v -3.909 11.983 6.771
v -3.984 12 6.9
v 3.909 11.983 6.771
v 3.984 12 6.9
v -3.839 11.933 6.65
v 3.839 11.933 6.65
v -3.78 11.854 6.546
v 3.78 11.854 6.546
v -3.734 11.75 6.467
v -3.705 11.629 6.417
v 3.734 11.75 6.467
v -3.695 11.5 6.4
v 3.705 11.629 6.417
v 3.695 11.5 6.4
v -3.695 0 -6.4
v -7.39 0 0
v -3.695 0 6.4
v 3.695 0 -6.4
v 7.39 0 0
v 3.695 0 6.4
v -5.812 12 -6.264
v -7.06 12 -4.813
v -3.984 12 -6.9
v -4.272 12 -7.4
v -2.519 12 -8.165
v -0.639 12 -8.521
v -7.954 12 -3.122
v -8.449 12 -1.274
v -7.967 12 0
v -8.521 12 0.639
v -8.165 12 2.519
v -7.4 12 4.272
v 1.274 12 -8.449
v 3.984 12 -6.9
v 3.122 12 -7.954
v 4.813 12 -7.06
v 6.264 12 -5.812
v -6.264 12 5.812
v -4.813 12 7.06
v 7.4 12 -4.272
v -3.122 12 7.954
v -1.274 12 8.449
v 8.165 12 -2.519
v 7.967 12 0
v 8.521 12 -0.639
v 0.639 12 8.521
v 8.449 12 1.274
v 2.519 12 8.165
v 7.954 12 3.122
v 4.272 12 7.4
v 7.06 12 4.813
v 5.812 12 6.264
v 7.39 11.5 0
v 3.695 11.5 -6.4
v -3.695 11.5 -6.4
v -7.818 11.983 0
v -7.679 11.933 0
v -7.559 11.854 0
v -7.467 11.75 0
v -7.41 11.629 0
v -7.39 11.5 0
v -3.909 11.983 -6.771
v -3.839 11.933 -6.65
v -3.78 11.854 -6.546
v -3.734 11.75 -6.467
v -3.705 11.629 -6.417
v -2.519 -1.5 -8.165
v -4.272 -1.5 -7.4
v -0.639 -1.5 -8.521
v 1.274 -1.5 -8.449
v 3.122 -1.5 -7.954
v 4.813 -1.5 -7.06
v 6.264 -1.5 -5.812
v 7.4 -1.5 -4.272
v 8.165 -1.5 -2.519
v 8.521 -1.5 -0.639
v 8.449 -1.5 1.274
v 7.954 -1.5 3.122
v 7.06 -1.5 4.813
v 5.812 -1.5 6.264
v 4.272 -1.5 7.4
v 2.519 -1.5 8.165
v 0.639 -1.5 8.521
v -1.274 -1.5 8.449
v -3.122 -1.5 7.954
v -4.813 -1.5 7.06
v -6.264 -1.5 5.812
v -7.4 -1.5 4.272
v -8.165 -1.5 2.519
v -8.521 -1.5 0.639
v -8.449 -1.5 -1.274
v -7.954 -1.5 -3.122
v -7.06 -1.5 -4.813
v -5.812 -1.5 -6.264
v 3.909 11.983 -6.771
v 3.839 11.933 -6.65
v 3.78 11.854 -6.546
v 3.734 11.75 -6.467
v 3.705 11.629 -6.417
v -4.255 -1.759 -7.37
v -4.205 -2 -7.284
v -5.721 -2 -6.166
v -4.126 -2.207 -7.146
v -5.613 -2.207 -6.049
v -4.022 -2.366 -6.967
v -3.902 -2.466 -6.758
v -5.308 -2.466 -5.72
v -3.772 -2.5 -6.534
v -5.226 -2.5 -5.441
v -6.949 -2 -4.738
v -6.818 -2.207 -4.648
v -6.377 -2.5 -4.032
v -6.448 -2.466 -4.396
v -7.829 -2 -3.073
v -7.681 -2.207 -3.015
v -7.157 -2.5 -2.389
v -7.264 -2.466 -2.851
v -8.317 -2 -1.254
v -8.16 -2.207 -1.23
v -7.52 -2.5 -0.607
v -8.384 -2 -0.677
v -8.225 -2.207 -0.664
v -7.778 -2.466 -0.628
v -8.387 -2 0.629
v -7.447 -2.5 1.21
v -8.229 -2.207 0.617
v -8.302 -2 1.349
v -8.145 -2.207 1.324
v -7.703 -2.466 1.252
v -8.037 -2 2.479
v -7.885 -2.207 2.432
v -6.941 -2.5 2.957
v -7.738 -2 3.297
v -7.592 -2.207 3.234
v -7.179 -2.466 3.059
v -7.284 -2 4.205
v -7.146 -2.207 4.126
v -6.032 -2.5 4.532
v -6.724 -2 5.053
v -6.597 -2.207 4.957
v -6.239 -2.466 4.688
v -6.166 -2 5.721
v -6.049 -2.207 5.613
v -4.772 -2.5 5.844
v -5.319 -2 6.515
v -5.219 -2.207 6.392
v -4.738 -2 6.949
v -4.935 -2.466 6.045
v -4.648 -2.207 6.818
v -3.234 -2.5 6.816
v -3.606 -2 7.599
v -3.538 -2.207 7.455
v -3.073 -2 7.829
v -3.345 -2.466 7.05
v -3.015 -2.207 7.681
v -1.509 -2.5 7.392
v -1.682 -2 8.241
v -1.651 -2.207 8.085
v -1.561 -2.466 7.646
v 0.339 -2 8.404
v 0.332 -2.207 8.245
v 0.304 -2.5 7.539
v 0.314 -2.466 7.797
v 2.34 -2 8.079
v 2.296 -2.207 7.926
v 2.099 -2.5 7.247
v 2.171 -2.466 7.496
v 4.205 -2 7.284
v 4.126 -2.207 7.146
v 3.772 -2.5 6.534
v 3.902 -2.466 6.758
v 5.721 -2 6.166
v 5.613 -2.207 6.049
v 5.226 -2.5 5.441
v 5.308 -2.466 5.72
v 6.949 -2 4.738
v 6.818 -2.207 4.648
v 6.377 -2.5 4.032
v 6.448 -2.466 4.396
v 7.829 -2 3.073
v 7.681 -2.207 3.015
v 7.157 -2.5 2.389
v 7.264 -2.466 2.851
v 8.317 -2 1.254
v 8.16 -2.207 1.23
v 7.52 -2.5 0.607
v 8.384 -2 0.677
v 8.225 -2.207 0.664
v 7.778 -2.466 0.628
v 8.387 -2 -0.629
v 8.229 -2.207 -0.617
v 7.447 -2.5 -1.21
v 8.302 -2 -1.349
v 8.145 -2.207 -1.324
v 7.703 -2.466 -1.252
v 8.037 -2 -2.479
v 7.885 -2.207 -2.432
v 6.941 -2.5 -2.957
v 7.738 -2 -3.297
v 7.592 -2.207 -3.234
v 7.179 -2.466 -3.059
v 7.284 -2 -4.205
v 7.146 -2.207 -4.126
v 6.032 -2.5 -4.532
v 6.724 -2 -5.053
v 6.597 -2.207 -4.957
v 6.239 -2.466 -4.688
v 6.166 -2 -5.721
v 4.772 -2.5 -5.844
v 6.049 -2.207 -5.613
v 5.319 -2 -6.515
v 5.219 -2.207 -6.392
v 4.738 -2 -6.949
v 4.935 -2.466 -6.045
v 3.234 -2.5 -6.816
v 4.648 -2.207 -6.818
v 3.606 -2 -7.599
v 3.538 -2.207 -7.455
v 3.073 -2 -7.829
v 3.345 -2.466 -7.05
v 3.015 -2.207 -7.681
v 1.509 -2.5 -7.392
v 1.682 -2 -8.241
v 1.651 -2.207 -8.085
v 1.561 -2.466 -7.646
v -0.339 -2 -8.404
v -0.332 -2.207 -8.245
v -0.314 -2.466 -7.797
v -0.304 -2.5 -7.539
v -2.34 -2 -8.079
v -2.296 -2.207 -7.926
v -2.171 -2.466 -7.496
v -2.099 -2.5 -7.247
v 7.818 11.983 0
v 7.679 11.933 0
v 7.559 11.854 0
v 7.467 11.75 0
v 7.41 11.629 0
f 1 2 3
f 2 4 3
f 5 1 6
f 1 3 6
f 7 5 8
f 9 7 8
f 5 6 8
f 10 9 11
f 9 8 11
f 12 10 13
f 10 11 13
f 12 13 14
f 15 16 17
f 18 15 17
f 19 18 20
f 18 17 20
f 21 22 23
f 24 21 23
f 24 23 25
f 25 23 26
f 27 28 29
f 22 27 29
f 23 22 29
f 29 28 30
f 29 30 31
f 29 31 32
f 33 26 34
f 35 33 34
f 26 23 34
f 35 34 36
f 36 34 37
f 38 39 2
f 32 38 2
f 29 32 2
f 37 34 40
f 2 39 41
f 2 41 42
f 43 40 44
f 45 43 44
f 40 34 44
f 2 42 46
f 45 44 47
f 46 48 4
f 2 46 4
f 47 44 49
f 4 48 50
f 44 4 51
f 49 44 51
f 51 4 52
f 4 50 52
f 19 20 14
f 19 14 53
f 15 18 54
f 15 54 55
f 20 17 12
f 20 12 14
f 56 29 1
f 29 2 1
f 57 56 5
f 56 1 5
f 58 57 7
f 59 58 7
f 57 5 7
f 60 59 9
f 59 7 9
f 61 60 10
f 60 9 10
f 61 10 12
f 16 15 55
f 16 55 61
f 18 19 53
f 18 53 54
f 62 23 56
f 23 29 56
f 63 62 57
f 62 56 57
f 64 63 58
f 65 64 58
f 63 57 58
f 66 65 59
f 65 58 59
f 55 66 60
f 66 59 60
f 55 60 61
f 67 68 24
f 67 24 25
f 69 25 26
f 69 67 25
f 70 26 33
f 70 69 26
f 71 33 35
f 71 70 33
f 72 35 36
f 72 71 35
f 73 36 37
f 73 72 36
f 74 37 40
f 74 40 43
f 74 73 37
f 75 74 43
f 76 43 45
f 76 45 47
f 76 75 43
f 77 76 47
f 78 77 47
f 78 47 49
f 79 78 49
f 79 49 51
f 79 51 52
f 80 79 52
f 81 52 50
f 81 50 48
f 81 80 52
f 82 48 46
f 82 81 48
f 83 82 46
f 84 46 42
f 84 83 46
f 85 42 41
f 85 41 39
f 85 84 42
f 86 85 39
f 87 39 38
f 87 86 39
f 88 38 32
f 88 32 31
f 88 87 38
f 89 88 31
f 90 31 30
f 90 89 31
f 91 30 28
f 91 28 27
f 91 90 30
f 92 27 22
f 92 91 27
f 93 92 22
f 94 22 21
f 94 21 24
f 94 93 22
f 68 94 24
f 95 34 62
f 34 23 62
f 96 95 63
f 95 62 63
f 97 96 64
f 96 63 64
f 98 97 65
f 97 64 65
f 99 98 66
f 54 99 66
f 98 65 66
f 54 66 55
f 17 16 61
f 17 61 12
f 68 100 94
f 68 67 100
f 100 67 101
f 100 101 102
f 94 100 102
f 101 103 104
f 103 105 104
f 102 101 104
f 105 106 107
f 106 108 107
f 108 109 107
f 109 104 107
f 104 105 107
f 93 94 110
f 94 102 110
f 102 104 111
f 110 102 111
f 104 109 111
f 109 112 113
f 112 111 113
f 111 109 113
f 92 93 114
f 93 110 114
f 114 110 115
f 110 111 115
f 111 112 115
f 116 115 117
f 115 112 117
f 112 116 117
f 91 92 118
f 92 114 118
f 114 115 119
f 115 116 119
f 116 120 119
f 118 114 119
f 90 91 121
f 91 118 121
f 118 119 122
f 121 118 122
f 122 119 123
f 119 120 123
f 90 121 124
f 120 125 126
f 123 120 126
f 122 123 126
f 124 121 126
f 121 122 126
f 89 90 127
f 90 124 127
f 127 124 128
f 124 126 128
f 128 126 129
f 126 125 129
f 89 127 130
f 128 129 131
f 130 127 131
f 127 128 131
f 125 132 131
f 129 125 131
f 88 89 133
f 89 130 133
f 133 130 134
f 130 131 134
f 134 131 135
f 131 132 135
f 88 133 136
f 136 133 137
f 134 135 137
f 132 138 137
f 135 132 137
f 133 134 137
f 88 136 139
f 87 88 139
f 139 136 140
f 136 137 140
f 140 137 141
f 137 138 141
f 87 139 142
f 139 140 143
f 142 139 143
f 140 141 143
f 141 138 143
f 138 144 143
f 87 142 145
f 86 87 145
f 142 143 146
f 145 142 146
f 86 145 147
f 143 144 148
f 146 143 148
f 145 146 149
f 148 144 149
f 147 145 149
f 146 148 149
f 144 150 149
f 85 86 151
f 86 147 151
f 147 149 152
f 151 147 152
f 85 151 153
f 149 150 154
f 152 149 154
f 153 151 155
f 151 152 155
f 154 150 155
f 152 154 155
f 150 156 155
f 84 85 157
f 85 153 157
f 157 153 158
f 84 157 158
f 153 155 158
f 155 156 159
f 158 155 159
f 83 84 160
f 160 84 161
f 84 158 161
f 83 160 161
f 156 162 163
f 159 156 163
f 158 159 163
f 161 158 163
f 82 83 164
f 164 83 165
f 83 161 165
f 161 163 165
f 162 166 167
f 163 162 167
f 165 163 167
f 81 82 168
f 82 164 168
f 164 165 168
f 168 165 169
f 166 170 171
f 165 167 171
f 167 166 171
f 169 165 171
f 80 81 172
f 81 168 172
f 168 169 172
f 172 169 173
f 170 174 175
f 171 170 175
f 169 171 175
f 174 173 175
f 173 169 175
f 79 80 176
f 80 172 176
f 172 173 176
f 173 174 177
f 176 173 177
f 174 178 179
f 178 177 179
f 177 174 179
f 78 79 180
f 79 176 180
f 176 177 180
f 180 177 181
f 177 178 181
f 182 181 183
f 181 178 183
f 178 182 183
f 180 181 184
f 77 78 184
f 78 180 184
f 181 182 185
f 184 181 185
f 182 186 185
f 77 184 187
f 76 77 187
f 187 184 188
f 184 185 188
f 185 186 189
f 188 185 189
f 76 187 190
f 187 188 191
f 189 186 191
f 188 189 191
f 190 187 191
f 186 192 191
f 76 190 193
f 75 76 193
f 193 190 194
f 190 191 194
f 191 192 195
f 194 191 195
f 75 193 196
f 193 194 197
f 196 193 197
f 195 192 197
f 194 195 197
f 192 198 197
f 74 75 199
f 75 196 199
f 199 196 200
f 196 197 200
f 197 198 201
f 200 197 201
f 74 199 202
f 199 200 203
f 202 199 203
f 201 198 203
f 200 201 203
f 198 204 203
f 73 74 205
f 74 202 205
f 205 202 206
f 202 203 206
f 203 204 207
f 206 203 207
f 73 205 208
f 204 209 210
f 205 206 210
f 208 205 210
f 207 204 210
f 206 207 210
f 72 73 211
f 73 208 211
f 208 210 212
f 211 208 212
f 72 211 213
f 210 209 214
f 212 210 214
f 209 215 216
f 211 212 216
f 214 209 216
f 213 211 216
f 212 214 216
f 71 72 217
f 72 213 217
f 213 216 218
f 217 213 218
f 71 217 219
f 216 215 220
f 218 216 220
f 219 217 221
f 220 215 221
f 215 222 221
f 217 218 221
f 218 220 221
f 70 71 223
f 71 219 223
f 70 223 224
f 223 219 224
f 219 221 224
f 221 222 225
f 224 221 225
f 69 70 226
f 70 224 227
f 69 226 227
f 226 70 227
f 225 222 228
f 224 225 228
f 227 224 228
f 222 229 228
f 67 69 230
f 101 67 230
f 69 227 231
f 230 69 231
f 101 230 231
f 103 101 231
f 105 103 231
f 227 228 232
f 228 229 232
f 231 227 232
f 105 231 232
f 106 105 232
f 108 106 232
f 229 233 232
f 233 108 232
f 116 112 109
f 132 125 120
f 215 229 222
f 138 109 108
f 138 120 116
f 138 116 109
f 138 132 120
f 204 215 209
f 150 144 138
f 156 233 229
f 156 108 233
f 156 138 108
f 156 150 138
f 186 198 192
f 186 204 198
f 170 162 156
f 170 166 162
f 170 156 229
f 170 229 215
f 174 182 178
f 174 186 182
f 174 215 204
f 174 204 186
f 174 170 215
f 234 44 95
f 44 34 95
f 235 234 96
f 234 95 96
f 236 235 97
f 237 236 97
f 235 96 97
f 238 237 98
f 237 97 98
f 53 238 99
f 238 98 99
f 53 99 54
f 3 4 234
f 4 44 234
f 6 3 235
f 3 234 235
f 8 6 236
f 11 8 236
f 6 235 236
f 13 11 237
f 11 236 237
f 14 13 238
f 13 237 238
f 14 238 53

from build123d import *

# Parameters (mm, degrees)
SALIENTE_EXTRUIR1_DEPTH = 12
SALIENTE_EXTRUIR2_DEPTH = 2.5
REDONDEO2_R             = 0.5
SALIENTE_EXTRUIR4_DEPTH = 14.5
REDONDEO5_R             = 1


with BuildPart() as part:
    # Croquis1 → Saliente-Extruir1 (new body)
    with BuildSketch(Plane(origin=(0, 0, 0), x_dir=(1, 0, 0), z_dir=(0, 1, 0))):
        Polygon((8.544783984006465, -6.5e-16), (4.272391992003232, 7.400000000000002), (-4.27239199200323, 7.400000000000003), (-8.544783984006463, 1.3e-15), (-4.272391992003225, -7.400000000000005), (4.272391992003232, -7.400000000000004), align=None)
        Polygon((-3.6950417228136043, 6.400000000000002), (-7.390083445627212, 8.7e-16), (-3.6950417228136003, -6.400000000000005), (3.695041722813607, -6.400000000000004), (7.390083445627214, -1.74e-15), (3.695041722813606, 6.400000000000002), align=None, mode=Mode.SUBTRACT)
    extrude(amount=SALIENTE_EXTRUIR1_DEPTH)

    # Croquis2 → Saliente-Extruir2 (add)
    with BuildSketch(Plane.XZ):
        Polygon((8.544783984006465, 6.5e-16), (4.272391992003232, 7.400000000000004), (-4.272391992003225, 7.400000000000005), (-8.544783984006463, -1.3e-15), (-4.27239199200323, -7.400000000000003), (4.272391992003232, -7.400000000000002), align=None)
    extrude(amount=SALIENTE_EXTRUIR2_DEPTH)

    # Redondeo2
    redondeo2_edges = [part.edges().sort_by_distance(p)[0] for p in [
        (8.9e-16, 12, -6.400000000000002),
        (-5.542562584220408, 12, -3.2000000000000015),
        (-5.5425625842204065, 12, 3.200000000000002),
        (3.11e-15, 12, 6.400000000000005),
        (5.542562584220411, 12, 3.200000000000003),
        (5.54256258422041, 12, -3.2),
    ]]
    fillet(redondeo2_edges, radius=REDONDEO2_R)

    # Croquis3 → Saliente-Extruir4 (add)
    with BuildSketch(Plane.XZ.offset(2.5)):
        with BuildLine():
            Line((4.272391992003232, 7.400000000000004), (8.544783984006465, 6.5e-16))
            ThreePointArc((8.544783984006463, 0), (7.400000000000001, 4.272391992003231), (4.2723919920032305, 7.400000000000002))
        make_face()
        with BuildLine():
            ThreePointArc((4.2723919920032305, 7.400000000000002), (2.42e-15, 8.544783984006463), (-4.272391992003226, 7.400000000000004))
            Line((-4.272391992003225, 7.400000000000005), (4.272391992003232, 7.400000000000004))
        make_face()
        with BuildLine():
            ThreePointArc((-4.272391992003226, 7.400000000000004), (-7.3999999999999995, 4.272391992003234), (-8.544783984006463, 1.05e-15))
            Line((-8.544783984006463, -8.9e-16), (-4.272391992003225, 7.400000000000005))
        make_face()
        with BuildLine():
            ThreePointArc((-8.544783984006463, 1.05e-15), (-7.400000000000001, -4.272391992003232), (-4.272391992003228, -7.400000000000003))
            Line((-4.27239199200323, -7.400000000000003), (-8.544783984006463, -1.3e-15))
        make_face()
        with BuildLine():
            Line((4.272391992003231, -7.400000000000002), (-4.27239199200323, -7.400000000000003))
            ThreePointArc((-4.272391992003228, -7.400000000000003), (-1.57e-15, -8.544783984006463), (4.272391992003226, -7.400000000000005))
        make_face()
        with BuildLine():
            Line((8.544783984006465, 8.9e-16), (4.272391992003232, -7.400000000000002))
            ThreePointArc((4.272391992003226, -7.400000000000005), (7.399999999999999, -4.272391992003235), (8.544783984006463, -2.09e-15))
        make_face()
    extrude(amount=-SALIENTE_EXTRUIR4_DEPTH)

    # Redondeo5
    redondeo5_edges = [part.edges().sort_by_distance(p)[0] for p in [
        (8.544783984006457, -2.5, -2.9e-16),
    ]]
    fillet(redondeo5_edges, radius=REDONDEO5_R)


solid = part.part
